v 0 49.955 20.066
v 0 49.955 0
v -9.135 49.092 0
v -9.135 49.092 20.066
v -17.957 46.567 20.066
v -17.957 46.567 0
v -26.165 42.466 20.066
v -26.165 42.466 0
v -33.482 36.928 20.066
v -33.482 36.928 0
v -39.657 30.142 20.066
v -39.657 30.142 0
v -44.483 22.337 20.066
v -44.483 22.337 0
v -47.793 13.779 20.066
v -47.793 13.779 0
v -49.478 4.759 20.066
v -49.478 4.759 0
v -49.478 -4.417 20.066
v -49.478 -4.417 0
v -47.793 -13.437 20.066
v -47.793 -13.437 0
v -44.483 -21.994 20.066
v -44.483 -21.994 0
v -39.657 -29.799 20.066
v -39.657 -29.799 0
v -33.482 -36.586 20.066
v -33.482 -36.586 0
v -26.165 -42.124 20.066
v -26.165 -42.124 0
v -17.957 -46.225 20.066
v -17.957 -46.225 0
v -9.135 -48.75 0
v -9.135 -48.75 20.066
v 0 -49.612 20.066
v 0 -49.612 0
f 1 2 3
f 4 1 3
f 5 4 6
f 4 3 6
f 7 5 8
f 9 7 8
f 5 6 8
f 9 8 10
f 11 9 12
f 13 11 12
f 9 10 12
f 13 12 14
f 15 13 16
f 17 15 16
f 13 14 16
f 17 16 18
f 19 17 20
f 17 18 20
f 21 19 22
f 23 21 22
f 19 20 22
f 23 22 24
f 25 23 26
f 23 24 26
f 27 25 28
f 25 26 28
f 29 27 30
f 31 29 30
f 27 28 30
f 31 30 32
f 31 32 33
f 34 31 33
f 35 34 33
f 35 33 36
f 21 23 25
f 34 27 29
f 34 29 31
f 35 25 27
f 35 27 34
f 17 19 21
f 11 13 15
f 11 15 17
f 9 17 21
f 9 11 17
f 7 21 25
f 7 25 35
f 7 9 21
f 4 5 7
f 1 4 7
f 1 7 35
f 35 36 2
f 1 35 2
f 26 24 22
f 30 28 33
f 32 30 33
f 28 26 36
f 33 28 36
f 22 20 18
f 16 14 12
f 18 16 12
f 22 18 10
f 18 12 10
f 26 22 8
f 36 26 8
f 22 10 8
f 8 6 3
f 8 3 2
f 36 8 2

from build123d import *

# Parameters (mm, degrees)
F0_R     = 49.911
F1_DEPTH = 99.822
F4_DEPTH = 20.066


with BuildPart() as f1:
    # F0 (on Top) → F1 (new body)
    with BuildSketch(Plane.XY):
        Circle(F0_R)
    extrude(amount=F1_DEPTH)


with BuildPart() as f4:
    # F2 (on Top) → F4 (new body)
    with BuildSketch(Plane.XY):
        with BuildLine():
            Line((0, -49.6124997735), (0, 49.9553204259))
            ThreePointArc((0, 49.9553204259), (-49.6893893018, 0.1714103262), (0, -49.6124997735))
        make_face()
    extrude(amount=F4_DEPTH)


solid = f4.part
